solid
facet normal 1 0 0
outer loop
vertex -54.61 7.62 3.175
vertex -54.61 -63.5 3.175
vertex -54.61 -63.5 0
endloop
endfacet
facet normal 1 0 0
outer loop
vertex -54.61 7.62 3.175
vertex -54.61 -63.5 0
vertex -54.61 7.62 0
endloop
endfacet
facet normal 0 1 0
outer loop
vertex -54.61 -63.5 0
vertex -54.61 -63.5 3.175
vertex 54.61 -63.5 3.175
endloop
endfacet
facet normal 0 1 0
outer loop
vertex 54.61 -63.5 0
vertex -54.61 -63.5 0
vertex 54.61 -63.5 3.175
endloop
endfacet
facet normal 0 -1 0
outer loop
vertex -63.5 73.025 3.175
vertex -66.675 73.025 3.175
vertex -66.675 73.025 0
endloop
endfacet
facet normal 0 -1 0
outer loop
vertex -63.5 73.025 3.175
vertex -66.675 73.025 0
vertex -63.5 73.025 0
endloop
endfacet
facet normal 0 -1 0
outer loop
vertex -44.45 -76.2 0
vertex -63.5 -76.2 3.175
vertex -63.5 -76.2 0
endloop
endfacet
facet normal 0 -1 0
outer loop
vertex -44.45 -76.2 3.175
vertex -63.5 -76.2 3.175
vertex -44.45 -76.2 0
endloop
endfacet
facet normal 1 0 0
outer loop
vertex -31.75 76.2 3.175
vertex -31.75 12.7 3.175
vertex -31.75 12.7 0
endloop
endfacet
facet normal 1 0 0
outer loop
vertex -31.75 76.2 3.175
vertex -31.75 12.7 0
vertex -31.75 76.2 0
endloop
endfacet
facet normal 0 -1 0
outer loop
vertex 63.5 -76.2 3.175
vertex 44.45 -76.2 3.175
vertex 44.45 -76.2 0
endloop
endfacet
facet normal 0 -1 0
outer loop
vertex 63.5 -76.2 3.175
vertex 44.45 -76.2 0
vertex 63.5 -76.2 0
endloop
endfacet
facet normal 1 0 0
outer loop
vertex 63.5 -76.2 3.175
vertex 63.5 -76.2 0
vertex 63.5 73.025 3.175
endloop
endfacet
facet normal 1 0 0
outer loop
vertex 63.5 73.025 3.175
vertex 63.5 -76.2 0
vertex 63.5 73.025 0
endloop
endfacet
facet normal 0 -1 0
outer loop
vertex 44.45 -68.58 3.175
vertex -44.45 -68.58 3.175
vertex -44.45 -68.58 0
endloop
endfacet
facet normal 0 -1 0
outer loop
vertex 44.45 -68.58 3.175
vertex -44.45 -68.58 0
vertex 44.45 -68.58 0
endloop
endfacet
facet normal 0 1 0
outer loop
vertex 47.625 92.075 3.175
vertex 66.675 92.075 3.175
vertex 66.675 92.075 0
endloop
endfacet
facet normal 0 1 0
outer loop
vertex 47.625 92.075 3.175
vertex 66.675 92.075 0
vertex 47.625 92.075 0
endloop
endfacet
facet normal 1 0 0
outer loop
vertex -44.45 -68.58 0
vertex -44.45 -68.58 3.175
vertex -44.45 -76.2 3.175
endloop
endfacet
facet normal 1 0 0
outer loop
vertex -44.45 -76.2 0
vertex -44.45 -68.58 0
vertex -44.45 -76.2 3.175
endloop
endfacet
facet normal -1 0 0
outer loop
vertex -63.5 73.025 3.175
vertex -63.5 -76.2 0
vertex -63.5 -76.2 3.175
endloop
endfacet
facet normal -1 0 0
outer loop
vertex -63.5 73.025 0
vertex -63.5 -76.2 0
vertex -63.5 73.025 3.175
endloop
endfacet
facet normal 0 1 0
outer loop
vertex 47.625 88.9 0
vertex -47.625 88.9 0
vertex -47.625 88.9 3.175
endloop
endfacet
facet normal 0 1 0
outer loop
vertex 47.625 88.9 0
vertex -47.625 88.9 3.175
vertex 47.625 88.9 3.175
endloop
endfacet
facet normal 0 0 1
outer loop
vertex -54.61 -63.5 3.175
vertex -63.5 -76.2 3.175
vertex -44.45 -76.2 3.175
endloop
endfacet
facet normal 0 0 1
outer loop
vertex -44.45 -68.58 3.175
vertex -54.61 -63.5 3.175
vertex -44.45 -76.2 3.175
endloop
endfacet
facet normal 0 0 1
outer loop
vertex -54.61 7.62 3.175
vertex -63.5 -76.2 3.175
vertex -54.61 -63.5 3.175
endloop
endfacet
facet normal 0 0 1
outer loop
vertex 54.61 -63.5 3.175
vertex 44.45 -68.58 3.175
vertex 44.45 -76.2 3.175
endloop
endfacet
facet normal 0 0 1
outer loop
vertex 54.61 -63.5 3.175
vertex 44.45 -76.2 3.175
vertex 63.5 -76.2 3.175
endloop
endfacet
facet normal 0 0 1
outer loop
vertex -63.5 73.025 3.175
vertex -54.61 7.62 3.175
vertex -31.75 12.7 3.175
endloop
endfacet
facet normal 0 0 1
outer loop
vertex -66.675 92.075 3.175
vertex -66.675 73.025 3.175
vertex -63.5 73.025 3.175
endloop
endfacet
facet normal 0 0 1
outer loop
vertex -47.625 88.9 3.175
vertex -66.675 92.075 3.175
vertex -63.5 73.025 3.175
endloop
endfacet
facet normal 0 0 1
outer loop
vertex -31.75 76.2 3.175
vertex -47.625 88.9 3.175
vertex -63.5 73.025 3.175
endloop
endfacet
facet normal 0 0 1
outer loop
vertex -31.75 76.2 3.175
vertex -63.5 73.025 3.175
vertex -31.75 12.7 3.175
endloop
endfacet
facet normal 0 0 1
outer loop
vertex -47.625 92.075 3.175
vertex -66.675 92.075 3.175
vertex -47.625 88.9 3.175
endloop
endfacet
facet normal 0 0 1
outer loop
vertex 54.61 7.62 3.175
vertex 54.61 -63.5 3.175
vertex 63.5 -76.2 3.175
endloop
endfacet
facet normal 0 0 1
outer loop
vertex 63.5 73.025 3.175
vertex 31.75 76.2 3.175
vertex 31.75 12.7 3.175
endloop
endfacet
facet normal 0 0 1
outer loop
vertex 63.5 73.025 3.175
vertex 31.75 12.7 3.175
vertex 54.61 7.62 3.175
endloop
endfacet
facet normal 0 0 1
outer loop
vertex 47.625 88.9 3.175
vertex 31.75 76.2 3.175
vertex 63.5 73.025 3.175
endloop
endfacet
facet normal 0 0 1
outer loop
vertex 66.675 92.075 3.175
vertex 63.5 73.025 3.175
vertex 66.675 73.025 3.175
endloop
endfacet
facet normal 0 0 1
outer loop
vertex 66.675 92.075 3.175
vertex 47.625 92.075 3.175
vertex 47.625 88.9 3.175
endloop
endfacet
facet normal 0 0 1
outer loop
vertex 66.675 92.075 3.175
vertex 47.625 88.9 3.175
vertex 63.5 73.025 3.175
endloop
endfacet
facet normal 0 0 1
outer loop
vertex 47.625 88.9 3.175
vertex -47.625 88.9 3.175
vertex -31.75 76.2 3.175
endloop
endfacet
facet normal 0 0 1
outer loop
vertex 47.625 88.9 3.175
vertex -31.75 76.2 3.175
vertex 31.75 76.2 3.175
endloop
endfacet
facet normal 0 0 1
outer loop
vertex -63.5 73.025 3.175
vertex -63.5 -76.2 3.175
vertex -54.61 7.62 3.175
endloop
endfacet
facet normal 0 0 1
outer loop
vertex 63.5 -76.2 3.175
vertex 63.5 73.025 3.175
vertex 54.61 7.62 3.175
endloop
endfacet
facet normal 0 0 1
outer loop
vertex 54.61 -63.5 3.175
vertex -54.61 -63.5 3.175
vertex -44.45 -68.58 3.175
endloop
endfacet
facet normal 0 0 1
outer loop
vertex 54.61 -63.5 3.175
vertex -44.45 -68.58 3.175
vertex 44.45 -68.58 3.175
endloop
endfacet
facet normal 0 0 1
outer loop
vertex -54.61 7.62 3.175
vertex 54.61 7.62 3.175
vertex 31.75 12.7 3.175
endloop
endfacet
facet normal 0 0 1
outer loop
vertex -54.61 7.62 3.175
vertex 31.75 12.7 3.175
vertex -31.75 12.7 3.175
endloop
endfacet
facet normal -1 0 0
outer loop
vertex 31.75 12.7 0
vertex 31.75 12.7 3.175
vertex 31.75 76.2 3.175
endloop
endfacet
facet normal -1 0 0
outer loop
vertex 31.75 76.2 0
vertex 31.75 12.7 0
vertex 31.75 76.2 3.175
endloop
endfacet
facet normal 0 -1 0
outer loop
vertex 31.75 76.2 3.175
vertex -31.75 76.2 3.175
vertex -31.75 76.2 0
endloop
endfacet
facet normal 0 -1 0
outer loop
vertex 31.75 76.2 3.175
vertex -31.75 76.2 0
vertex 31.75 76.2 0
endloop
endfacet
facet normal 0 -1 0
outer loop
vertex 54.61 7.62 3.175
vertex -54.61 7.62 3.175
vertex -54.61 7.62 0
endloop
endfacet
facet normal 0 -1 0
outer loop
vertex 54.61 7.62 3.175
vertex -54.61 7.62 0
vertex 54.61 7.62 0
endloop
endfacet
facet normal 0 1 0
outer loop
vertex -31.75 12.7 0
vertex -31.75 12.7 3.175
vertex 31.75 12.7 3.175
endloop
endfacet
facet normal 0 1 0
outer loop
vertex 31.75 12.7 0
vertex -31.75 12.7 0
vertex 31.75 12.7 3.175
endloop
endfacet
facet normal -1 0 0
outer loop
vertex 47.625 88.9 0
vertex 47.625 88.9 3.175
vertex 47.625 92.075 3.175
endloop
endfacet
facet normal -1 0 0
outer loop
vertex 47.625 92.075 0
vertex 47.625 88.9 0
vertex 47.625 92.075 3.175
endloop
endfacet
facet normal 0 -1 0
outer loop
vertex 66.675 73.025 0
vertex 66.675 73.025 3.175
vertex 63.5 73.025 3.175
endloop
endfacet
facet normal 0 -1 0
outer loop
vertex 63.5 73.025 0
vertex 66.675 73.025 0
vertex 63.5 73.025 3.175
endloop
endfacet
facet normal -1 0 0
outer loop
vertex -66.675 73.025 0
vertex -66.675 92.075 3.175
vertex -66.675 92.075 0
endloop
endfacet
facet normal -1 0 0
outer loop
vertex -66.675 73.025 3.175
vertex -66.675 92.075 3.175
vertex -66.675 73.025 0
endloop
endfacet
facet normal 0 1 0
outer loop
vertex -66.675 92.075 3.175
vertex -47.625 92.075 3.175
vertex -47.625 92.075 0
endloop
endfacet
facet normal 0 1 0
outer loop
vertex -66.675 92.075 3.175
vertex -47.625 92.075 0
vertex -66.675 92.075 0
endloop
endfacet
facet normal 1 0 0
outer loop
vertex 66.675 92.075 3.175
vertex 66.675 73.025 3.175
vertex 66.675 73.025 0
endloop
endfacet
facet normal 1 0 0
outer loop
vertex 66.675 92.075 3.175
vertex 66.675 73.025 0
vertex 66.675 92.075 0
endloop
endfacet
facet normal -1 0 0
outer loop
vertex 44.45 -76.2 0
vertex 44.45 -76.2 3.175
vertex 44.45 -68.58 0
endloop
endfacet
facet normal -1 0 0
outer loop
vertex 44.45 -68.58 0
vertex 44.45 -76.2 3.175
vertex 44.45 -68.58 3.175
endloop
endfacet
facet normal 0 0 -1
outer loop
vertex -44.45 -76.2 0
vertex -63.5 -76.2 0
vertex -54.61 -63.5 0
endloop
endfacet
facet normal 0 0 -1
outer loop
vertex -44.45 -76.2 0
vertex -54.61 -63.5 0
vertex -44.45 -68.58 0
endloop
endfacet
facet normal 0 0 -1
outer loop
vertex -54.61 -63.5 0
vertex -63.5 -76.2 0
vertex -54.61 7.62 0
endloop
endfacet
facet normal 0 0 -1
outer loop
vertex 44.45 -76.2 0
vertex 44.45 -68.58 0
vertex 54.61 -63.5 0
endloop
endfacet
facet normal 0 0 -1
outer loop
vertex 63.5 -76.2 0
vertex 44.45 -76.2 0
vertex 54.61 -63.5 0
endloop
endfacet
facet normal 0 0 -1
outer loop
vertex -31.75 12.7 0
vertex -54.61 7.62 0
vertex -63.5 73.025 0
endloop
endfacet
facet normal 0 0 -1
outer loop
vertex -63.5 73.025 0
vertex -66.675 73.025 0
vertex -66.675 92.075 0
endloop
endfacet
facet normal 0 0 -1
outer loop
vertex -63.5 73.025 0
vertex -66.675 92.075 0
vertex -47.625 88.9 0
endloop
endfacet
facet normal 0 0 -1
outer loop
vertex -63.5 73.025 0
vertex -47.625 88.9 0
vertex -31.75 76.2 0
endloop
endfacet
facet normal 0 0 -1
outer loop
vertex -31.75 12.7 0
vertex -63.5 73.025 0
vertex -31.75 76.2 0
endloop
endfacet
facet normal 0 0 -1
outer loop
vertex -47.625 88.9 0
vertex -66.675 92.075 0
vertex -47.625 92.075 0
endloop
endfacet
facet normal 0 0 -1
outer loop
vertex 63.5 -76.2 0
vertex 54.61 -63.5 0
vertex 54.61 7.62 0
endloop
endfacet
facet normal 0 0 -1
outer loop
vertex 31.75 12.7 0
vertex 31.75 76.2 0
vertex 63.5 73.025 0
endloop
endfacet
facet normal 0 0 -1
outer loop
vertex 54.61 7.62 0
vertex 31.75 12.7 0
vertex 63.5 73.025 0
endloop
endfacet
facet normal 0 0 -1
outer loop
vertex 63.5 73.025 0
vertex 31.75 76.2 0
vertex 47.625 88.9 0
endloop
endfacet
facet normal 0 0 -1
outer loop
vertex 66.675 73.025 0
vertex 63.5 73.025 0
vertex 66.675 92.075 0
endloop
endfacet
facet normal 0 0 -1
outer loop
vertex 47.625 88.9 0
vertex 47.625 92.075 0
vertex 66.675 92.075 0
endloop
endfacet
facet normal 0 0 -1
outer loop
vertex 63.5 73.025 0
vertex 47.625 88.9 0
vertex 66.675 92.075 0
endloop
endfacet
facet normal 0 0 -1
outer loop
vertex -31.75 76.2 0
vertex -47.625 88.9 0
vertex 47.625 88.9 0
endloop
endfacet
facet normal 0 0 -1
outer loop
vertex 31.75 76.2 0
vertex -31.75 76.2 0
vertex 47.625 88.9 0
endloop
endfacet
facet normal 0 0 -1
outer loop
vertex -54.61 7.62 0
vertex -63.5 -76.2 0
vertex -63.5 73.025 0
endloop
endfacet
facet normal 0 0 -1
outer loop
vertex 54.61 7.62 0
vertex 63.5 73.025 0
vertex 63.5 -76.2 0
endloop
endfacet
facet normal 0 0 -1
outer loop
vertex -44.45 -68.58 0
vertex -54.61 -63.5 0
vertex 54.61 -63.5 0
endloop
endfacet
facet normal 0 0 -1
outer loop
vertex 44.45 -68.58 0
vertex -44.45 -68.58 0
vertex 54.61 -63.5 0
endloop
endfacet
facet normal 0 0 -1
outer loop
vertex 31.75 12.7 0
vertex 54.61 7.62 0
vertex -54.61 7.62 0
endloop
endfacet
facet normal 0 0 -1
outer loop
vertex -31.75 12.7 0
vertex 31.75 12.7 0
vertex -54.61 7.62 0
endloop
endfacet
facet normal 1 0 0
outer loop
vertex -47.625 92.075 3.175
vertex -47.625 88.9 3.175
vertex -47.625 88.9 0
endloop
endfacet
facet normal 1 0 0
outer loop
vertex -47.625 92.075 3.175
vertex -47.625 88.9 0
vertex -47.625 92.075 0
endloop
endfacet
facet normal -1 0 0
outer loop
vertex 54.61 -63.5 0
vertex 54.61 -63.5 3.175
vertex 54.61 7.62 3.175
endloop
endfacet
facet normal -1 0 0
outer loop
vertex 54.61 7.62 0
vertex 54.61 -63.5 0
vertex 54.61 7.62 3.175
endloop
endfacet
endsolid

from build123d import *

# Parameters (mm, degrees)
SKETCH1_W           = 127
SKETCH1_H           = 177.8
BOSS_EXTRUDE1_DEPTH = 3.175
SKETCH3_W           = 63.5
SKETCH3_H           = 63.5
SKETCH3_W_2         = 109.22
SKETCH3_H_2         = 71.12
CUT_EXTRUDE2_DEPTH  = 4.175
BOSS_EXTRUDE2_DEPTH = 3.175
CUT_EXTRUDE3_REACH  = 5.175
SKETCH5_W           = 19.05
SKETCH5_H           = 12.7
CUT_EXTRUDE4_DEPTH  = 4.175


with BuildPart() as part:
    # Sketch1 → Boss-Extrude1 (new body)
    with BuildSketch(Plane.XY):
        Rectangle(SKETCH1_W, SKETCH1_H)
    extrude(amount=BOSS_EXTRUDE1_DEPTH)

    # Sketch3 → Cut-Extrude2 (cut, through all)
    with BuildSketch(Plane.XY.offset(3.175)):
        with Locations((0, 44.45)):
            Rectangle(SKETCH3_W, SKETCH3_H)
        with Locations((0, -27.94)):
            Rectangle(SKETCH3_W_2, SKETCH3_H_2)
    extrude(amount=-CUT_EXTRUDE2_DEPTH, mode=Mode.SUBTRACT)

    # Sketch4 → Boss-Extrude2 (add)
    with BuildSketch(Plane.XY.offset(3.175)):
        Polygon((-60.325, 92.075), (-66.675, 92.075), (-66.675, 85.725), (-66.675, 73.025), (-60.325, 73.025), (-60.325, 85.725), (-47.625, 85.725), (-47.625, 92.075), align=None)
        Polygon((60.325, 92.075), (66.675, 92.075), (66.675, 85.725), (66.675, 73.025), (60.325, 73.025), (60.325, 85.725), (47.625, 85.725), (47.625, 92.075), align=None)
    extrude(amount=-BOSS_EXTRUDE2_DEPTH)

    # Sketch5 → Cut-Extrude3 (cut, up to next)
    with BuildSketch(Plane.XY.offset(3.175), mode=Mode.PRIVATE) as cut_extrude3_sk1:
        with Locations((-53.975, -82.55)):
            Rectangle(SKETCH5_W, SKETCH5_H)
    cut_extrude3_tool1 = extrude(cut_extrude3_sk1.sketch, amount=-CUT_EXTRUDE3_REACH, mode=Mode.PRIVATE) & part.part
    add(cut_extrude3_tool1.solids().sort_by_distance((-53.975, -82.55, 3.175))[0], mode=Mode.SUBTRACT)
    # Sketch5 → Cut-Extrude3 (cut, up to next)
    with BuildSketch(Plane.XY.offset(3.175), mode=Mode.PRIVATE) as cut_extrude3_sk2:
        with Locations((53.975, -82.55)):
            Rectangle(SKETCH5_W, SKETCH5_H)
    cut_extrude3_tool2 = extrude(cut_extrude3_sk2.sketch, amount=-CUT_EXTRUDE3_REACH, mode=Mode.PRIVATE) & part.part
    add(cut_extrude3_tool2.solids().sort_by_distance((53.975, -82.55, 3.175))[0], mode=Mode.SUBTRACT)

    # Sketch6 → Cut-Extrude4 (cut, through all)
    with BuildSketch(Plane.XY.offset(3.175)):
        Polygon((-44.45, -76.2), (-44.45, -68.58), (44.45, -68.58), (44.45, -76.2), (44.45, -88.9), (-44.45, -88.9), align=None)
    extrude(amount=-CUT_EXTRUDE4_DEPTH, mode=Mode.SUBTRACT)


solid = part.part
